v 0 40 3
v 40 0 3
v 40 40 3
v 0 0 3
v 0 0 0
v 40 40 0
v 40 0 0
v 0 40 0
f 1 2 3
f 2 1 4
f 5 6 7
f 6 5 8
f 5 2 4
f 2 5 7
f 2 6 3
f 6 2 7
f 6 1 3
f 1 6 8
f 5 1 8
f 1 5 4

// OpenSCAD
// A tile with four faults in it, on purpose.
//
// This file is a test fixture, not a design. It exists so scripts/
// validate-example.mjs can be watched FAILING on every check before anyone
// trusts it to pass on a real tile. Nothing loads it and nothing renders it.
//
// The faults, in the order the validator finds them:
//   1. manifest.json has no "license".
//   2. plate_shape has no comment above it, so the app has nothing to label
//      the control with.
//   3. logo_file defaults to undeclared-logo.svg, which is in this folder and
//      is not listed in manifest.json - the exact shape of an earlier bug,
//      where the file was right there and the app still could not find it.
//   4. dot_height is declared tactile in the manifest, has no documented
//      range, and nothing asserts it.
//
// License: CC0-1.0

/* [Plate] */

plate_shape = "square"; // [square, round]

// Image to engrave
logo_file = "undeclared-logo.svg"; // [file:svg,png,jpg]

// Height of the raised dots
dot_height = 0.6;

/* [Hidden] */

module plate() {
    if (plate_shape == "round") cylinder(d = 40, h = 3);
    else cube([40, 40, 3]);
}

plate();
